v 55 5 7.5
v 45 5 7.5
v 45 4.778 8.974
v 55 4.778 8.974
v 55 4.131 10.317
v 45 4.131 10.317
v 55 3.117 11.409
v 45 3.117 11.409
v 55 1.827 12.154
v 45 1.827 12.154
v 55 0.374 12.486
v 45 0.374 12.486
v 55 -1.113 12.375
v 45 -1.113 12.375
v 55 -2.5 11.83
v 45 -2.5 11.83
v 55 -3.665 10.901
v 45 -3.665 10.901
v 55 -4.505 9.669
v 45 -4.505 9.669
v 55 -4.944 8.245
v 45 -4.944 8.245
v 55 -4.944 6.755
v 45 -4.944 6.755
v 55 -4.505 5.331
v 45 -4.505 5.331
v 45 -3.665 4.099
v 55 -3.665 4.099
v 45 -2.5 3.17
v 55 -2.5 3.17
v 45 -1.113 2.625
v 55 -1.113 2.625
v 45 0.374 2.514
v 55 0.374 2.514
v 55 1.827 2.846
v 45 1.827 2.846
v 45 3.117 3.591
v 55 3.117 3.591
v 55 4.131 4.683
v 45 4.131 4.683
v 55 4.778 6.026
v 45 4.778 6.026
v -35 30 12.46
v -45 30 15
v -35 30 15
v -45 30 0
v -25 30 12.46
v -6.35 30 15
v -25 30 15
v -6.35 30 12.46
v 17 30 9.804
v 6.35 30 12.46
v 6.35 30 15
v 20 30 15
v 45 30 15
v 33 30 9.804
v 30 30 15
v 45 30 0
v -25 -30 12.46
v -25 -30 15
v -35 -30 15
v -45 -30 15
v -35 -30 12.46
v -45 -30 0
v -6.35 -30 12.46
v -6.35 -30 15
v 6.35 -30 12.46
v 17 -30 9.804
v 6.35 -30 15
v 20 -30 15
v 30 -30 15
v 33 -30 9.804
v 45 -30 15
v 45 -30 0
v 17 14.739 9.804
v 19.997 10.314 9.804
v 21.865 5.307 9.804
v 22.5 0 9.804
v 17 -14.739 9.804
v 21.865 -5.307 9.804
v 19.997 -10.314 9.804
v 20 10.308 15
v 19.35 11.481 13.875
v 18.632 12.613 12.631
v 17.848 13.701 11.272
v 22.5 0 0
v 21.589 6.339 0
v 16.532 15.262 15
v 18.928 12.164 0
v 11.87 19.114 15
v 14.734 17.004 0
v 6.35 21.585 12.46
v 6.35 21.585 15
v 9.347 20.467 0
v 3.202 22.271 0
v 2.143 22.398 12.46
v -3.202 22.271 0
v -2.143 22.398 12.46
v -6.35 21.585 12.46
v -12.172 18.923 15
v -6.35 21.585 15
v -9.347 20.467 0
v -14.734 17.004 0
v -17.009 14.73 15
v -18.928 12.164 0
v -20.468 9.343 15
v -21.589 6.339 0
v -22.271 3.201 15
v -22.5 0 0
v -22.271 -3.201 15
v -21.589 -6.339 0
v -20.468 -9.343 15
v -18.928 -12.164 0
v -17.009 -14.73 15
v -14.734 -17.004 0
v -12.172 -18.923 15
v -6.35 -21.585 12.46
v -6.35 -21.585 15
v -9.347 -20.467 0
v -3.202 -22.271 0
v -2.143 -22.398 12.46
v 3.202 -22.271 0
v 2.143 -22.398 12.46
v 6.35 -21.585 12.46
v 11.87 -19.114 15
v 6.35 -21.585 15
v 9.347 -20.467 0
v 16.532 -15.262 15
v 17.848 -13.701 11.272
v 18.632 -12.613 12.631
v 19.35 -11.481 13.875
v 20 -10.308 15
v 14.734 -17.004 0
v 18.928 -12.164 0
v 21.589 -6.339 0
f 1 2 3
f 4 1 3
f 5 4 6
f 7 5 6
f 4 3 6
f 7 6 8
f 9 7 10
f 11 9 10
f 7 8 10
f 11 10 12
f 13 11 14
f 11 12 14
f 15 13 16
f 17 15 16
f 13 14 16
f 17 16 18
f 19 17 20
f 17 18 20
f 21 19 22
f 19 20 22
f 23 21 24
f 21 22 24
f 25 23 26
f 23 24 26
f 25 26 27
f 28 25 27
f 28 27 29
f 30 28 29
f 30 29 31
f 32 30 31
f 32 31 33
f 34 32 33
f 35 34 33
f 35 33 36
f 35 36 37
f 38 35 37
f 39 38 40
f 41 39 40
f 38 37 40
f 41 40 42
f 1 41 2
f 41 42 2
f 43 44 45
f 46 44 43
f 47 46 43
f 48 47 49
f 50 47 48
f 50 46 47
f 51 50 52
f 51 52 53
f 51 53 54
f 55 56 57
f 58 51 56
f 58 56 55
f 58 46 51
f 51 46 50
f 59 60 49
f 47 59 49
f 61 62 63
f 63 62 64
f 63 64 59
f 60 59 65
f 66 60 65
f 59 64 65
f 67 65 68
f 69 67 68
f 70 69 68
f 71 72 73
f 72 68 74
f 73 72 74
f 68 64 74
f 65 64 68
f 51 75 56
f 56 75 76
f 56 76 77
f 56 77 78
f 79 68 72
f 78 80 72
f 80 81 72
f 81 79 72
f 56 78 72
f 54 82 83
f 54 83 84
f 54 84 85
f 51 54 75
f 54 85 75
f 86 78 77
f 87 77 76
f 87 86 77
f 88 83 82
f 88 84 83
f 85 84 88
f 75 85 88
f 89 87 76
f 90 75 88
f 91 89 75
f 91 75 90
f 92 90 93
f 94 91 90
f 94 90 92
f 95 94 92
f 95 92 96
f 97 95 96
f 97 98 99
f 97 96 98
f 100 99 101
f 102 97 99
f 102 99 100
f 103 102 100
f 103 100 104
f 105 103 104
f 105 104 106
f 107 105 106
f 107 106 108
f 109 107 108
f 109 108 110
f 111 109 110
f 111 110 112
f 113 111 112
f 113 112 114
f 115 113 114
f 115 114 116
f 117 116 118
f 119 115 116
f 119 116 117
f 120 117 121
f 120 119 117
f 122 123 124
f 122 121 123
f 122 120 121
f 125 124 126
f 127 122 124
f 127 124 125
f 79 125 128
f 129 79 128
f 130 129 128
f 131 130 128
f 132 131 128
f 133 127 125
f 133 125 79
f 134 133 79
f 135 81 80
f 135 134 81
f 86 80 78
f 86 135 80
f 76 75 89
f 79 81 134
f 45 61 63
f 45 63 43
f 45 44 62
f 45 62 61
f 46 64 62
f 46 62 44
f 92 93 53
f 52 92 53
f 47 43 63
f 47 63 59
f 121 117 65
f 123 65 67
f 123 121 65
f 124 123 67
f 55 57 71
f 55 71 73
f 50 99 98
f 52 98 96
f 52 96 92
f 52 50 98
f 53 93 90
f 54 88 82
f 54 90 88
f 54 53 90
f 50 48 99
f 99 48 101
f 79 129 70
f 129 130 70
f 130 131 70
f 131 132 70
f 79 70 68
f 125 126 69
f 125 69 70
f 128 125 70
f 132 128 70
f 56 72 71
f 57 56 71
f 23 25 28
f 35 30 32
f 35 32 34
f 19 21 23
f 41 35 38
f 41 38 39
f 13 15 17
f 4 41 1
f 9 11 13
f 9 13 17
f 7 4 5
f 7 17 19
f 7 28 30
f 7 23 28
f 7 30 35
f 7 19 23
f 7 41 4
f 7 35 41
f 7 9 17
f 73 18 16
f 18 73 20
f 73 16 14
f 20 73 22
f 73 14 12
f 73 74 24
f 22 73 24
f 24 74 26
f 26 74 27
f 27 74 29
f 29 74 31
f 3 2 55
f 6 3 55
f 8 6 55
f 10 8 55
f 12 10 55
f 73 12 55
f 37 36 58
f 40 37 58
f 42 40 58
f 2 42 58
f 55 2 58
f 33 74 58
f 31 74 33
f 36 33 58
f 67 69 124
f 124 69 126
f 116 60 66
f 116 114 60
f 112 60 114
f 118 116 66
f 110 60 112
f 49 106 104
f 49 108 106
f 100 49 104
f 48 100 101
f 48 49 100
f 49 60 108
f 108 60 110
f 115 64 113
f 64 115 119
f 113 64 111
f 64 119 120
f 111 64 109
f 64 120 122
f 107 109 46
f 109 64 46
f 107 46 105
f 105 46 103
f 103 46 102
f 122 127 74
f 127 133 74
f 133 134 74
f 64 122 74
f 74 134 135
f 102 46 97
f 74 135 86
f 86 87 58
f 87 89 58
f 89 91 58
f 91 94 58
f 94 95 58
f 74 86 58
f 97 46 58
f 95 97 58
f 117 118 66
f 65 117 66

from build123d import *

# Parameters (mm, degrees)
F0_W     = 90
F0_H     = 60
F0_R     = 22.5
F1_DEPTH = 15
F2_W     = 10
F2_H     = 60
F3_DEPTH = 2.54
F5_DEPTH = 60.001
F6_R     = 5
F7_DEPTH = 10


with BuildPart() as f1:
    # F0 (on Top) → F1 (new body)
    with BuildSketch(Plane.XY):
        Rectangle(F0_W, F0_H)
        Circle(F0_R, mode=Mode.SUBTRACT)
    extrude(amount=F1_DEPTH)

    # F2 (on face) → F3 (cut)
    with BuildSketch(Plane.XY.offset(15)):
        with Locations((-30, 0)):
            Rectangle(F2_W, F2_H)
        with BuildLine():
            Line((6.35, 30), (-6.35, 30))
            Line((-6.35, 30), (-6.35, 21.585354))
            ThreePointArc((-6.35, 21.585354), (0, 22.5), (6.35, 21.585354))
            Line((6.35, 21.585354), (6.35, 30))
        make_face()
        with BuildLine():
            Line((-6.35, -21.585354), (-6.35, -30))
            Line((-6.35, -30), (6.35, -30))
            Line((6.35, -30), (6.35, -21.585354))
            ThreePointArc((6.35, -21.585354), (0, -22.5), (-6.35, -21.585354))
        make_face()
    extrude(amount=-F3_DEPTH, mode=Mode.SUBTRACT)

    # F4 (on face) → F5 (cut, through all)
    with BuildSketch(Plane.XZ.offset(30)):
        Polygon((30, 15), (20, 15), (17, 9.803848), (33, 9.803848), align=None)
    extrude(amount=-F5_DEPTH, mode=Mode.SUBTRACT)

    # F6 (on face) → F7 (join)
    with BuildSketch(Plane.YZ.offset(45)):
        with Locations((0, 7.5)):
            Circle(F6_R)
    extrude(amount=F7_DEPTH)


solid = f1.part
